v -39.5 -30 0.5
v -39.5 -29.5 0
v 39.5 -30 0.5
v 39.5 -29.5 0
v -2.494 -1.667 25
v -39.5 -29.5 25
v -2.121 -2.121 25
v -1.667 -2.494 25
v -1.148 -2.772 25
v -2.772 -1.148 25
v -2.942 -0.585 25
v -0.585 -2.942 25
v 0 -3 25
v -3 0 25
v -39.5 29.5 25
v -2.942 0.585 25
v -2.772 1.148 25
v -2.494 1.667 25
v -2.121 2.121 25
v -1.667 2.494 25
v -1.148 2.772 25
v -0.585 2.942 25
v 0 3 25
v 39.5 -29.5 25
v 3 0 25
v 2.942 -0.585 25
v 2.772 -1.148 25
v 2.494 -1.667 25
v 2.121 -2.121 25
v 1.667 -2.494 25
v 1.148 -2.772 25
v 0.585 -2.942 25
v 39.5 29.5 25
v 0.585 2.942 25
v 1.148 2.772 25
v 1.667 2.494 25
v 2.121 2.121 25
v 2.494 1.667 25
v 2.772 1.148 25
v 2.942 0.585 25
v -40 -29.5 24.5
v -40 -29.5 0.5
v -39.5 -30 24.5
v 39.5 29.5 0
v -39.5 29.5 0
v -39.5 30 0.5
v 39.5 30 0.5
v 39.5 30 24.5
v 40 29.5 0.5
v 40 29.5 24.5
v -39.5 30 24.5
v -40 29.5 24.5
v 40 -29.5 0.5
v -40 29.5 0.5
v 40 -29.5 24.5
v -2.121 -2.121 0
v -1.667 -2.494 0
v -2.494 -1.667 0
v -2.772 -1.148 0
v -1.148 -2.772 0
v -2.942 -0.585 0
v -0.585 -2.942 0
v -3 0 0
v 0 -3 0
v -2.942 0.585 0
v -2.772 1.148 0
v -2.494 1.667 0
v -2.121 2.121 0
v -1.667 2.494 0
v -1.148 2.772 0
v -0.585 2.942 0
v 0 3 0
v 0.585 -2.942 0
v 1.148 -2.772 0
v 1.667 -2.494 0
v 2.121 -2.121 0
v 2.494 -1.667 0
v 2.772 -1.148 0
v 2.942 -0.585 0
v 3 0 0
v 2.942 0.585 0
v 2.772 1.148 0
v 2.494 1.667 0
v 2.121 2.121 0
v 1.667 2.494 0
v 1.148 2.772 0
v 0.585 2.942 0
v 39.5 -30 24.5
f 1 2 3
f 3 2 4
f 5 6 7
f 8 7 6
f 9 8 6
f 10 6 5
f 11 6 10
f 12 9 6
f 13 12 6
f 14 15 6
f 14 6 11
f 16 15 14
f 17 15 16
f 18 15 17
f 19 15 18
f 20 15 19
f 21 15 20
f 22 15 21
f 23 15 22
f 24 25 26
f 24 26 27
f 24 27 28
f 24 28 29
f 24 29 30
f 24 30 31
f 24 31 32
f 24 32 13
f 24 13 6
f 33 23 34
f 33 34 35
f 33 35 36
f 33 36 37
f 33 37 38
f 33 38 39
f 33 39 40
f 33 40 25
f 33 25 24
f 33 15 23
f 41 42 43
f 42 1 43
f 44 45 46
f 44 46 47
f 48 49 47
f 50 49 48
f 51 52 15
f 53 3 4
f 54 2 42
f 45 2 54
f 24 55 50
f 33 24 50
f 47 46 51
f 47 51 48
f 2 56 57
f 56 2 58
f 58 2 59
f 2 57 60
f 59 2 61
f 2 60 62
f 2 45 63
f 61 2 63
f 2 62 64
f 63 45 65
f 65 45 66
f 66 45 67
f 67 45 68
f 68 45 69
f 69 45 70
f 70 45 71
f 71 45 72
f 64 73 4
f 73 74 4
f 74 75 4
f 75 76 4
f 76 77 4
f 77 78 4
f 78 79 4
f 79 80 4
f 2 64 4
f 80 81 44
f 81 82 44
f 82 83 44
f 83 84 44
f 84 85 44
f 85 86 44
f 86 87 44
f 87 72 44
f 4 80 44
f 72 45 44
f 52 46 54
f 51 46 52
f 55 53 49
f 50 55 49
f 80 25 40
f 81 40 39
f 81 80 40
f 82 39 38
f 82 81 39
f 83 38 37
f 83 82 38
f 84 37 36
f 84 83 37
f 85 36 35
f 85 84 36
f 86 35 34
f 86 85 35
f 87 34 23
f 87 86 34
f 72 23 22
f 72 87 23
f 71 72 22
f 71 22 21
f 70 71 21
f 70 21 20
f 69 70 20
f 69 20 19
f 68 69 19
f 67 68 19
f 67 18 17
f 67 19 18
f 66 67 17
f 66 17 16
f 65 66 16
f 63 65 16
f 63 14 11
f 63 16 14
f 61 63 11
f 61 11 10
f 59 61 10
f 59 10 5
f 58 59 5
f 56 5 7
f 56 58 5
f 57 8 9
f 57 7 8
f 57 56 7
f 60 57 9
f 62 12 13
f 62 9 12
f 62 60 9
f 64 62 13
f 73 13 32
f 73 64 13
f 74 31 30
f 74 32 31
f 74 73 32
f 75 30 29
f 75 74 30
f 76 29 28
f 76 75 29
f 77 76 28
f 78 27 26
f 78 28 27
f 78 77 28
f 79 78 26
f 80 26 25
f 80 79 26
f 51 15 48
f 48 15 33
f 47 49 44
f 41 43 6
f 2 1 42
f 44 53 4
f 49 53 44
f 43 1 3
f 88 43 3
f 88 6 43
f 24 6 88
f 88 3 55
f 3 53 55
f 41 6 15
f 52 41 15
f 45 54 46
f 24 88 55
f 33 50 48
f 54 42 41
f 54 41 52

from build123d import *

# Parameters (mm, degrees)
SKETCH_W     = 80
SKETCH_H     = 60
PAD_DEPTH    = 25
SKETCH001_R  = 3
POCKET_DEPTH = 25.001
CHAMFER_SIZE = 0.5


with BuildPart() as part:
    # Sketch → Pad (new body)
    with BuildSketch(Plane.XY):
        Rectangle(SKETCH_W, SKETCH_H)
    extrude(amount=PAD_DEPTH)

    # Sketch001 → Pocket (cut, through all)
    with BuildSketch(Plane.XY):
        Circle(SKETCH001_R)
    extrude(amount=POCKET_DEPTH, mode=Mode.SUBTRACT)

    # Chamfer
    chamfer_edges = [part.edges().sort_by_distance(p)[0] for p in [
        (-40, -30, 12.5),
        (40, -30, 12.5),
        (0, -30, 0),
        (0, -30, 25),
        (40, 30, 12.5),
        (40, 0, 0),
        (40, 0, 25),
        (-40, 30, 12.5),
        (-40, 0, 0),
        (-40, 0, 25),
        (0, 30, 0),
        (0, 30, 25),
    ]]
    chamfer(chamfer_edges, length=CHAMFER_SIZE)


solid = part.part
